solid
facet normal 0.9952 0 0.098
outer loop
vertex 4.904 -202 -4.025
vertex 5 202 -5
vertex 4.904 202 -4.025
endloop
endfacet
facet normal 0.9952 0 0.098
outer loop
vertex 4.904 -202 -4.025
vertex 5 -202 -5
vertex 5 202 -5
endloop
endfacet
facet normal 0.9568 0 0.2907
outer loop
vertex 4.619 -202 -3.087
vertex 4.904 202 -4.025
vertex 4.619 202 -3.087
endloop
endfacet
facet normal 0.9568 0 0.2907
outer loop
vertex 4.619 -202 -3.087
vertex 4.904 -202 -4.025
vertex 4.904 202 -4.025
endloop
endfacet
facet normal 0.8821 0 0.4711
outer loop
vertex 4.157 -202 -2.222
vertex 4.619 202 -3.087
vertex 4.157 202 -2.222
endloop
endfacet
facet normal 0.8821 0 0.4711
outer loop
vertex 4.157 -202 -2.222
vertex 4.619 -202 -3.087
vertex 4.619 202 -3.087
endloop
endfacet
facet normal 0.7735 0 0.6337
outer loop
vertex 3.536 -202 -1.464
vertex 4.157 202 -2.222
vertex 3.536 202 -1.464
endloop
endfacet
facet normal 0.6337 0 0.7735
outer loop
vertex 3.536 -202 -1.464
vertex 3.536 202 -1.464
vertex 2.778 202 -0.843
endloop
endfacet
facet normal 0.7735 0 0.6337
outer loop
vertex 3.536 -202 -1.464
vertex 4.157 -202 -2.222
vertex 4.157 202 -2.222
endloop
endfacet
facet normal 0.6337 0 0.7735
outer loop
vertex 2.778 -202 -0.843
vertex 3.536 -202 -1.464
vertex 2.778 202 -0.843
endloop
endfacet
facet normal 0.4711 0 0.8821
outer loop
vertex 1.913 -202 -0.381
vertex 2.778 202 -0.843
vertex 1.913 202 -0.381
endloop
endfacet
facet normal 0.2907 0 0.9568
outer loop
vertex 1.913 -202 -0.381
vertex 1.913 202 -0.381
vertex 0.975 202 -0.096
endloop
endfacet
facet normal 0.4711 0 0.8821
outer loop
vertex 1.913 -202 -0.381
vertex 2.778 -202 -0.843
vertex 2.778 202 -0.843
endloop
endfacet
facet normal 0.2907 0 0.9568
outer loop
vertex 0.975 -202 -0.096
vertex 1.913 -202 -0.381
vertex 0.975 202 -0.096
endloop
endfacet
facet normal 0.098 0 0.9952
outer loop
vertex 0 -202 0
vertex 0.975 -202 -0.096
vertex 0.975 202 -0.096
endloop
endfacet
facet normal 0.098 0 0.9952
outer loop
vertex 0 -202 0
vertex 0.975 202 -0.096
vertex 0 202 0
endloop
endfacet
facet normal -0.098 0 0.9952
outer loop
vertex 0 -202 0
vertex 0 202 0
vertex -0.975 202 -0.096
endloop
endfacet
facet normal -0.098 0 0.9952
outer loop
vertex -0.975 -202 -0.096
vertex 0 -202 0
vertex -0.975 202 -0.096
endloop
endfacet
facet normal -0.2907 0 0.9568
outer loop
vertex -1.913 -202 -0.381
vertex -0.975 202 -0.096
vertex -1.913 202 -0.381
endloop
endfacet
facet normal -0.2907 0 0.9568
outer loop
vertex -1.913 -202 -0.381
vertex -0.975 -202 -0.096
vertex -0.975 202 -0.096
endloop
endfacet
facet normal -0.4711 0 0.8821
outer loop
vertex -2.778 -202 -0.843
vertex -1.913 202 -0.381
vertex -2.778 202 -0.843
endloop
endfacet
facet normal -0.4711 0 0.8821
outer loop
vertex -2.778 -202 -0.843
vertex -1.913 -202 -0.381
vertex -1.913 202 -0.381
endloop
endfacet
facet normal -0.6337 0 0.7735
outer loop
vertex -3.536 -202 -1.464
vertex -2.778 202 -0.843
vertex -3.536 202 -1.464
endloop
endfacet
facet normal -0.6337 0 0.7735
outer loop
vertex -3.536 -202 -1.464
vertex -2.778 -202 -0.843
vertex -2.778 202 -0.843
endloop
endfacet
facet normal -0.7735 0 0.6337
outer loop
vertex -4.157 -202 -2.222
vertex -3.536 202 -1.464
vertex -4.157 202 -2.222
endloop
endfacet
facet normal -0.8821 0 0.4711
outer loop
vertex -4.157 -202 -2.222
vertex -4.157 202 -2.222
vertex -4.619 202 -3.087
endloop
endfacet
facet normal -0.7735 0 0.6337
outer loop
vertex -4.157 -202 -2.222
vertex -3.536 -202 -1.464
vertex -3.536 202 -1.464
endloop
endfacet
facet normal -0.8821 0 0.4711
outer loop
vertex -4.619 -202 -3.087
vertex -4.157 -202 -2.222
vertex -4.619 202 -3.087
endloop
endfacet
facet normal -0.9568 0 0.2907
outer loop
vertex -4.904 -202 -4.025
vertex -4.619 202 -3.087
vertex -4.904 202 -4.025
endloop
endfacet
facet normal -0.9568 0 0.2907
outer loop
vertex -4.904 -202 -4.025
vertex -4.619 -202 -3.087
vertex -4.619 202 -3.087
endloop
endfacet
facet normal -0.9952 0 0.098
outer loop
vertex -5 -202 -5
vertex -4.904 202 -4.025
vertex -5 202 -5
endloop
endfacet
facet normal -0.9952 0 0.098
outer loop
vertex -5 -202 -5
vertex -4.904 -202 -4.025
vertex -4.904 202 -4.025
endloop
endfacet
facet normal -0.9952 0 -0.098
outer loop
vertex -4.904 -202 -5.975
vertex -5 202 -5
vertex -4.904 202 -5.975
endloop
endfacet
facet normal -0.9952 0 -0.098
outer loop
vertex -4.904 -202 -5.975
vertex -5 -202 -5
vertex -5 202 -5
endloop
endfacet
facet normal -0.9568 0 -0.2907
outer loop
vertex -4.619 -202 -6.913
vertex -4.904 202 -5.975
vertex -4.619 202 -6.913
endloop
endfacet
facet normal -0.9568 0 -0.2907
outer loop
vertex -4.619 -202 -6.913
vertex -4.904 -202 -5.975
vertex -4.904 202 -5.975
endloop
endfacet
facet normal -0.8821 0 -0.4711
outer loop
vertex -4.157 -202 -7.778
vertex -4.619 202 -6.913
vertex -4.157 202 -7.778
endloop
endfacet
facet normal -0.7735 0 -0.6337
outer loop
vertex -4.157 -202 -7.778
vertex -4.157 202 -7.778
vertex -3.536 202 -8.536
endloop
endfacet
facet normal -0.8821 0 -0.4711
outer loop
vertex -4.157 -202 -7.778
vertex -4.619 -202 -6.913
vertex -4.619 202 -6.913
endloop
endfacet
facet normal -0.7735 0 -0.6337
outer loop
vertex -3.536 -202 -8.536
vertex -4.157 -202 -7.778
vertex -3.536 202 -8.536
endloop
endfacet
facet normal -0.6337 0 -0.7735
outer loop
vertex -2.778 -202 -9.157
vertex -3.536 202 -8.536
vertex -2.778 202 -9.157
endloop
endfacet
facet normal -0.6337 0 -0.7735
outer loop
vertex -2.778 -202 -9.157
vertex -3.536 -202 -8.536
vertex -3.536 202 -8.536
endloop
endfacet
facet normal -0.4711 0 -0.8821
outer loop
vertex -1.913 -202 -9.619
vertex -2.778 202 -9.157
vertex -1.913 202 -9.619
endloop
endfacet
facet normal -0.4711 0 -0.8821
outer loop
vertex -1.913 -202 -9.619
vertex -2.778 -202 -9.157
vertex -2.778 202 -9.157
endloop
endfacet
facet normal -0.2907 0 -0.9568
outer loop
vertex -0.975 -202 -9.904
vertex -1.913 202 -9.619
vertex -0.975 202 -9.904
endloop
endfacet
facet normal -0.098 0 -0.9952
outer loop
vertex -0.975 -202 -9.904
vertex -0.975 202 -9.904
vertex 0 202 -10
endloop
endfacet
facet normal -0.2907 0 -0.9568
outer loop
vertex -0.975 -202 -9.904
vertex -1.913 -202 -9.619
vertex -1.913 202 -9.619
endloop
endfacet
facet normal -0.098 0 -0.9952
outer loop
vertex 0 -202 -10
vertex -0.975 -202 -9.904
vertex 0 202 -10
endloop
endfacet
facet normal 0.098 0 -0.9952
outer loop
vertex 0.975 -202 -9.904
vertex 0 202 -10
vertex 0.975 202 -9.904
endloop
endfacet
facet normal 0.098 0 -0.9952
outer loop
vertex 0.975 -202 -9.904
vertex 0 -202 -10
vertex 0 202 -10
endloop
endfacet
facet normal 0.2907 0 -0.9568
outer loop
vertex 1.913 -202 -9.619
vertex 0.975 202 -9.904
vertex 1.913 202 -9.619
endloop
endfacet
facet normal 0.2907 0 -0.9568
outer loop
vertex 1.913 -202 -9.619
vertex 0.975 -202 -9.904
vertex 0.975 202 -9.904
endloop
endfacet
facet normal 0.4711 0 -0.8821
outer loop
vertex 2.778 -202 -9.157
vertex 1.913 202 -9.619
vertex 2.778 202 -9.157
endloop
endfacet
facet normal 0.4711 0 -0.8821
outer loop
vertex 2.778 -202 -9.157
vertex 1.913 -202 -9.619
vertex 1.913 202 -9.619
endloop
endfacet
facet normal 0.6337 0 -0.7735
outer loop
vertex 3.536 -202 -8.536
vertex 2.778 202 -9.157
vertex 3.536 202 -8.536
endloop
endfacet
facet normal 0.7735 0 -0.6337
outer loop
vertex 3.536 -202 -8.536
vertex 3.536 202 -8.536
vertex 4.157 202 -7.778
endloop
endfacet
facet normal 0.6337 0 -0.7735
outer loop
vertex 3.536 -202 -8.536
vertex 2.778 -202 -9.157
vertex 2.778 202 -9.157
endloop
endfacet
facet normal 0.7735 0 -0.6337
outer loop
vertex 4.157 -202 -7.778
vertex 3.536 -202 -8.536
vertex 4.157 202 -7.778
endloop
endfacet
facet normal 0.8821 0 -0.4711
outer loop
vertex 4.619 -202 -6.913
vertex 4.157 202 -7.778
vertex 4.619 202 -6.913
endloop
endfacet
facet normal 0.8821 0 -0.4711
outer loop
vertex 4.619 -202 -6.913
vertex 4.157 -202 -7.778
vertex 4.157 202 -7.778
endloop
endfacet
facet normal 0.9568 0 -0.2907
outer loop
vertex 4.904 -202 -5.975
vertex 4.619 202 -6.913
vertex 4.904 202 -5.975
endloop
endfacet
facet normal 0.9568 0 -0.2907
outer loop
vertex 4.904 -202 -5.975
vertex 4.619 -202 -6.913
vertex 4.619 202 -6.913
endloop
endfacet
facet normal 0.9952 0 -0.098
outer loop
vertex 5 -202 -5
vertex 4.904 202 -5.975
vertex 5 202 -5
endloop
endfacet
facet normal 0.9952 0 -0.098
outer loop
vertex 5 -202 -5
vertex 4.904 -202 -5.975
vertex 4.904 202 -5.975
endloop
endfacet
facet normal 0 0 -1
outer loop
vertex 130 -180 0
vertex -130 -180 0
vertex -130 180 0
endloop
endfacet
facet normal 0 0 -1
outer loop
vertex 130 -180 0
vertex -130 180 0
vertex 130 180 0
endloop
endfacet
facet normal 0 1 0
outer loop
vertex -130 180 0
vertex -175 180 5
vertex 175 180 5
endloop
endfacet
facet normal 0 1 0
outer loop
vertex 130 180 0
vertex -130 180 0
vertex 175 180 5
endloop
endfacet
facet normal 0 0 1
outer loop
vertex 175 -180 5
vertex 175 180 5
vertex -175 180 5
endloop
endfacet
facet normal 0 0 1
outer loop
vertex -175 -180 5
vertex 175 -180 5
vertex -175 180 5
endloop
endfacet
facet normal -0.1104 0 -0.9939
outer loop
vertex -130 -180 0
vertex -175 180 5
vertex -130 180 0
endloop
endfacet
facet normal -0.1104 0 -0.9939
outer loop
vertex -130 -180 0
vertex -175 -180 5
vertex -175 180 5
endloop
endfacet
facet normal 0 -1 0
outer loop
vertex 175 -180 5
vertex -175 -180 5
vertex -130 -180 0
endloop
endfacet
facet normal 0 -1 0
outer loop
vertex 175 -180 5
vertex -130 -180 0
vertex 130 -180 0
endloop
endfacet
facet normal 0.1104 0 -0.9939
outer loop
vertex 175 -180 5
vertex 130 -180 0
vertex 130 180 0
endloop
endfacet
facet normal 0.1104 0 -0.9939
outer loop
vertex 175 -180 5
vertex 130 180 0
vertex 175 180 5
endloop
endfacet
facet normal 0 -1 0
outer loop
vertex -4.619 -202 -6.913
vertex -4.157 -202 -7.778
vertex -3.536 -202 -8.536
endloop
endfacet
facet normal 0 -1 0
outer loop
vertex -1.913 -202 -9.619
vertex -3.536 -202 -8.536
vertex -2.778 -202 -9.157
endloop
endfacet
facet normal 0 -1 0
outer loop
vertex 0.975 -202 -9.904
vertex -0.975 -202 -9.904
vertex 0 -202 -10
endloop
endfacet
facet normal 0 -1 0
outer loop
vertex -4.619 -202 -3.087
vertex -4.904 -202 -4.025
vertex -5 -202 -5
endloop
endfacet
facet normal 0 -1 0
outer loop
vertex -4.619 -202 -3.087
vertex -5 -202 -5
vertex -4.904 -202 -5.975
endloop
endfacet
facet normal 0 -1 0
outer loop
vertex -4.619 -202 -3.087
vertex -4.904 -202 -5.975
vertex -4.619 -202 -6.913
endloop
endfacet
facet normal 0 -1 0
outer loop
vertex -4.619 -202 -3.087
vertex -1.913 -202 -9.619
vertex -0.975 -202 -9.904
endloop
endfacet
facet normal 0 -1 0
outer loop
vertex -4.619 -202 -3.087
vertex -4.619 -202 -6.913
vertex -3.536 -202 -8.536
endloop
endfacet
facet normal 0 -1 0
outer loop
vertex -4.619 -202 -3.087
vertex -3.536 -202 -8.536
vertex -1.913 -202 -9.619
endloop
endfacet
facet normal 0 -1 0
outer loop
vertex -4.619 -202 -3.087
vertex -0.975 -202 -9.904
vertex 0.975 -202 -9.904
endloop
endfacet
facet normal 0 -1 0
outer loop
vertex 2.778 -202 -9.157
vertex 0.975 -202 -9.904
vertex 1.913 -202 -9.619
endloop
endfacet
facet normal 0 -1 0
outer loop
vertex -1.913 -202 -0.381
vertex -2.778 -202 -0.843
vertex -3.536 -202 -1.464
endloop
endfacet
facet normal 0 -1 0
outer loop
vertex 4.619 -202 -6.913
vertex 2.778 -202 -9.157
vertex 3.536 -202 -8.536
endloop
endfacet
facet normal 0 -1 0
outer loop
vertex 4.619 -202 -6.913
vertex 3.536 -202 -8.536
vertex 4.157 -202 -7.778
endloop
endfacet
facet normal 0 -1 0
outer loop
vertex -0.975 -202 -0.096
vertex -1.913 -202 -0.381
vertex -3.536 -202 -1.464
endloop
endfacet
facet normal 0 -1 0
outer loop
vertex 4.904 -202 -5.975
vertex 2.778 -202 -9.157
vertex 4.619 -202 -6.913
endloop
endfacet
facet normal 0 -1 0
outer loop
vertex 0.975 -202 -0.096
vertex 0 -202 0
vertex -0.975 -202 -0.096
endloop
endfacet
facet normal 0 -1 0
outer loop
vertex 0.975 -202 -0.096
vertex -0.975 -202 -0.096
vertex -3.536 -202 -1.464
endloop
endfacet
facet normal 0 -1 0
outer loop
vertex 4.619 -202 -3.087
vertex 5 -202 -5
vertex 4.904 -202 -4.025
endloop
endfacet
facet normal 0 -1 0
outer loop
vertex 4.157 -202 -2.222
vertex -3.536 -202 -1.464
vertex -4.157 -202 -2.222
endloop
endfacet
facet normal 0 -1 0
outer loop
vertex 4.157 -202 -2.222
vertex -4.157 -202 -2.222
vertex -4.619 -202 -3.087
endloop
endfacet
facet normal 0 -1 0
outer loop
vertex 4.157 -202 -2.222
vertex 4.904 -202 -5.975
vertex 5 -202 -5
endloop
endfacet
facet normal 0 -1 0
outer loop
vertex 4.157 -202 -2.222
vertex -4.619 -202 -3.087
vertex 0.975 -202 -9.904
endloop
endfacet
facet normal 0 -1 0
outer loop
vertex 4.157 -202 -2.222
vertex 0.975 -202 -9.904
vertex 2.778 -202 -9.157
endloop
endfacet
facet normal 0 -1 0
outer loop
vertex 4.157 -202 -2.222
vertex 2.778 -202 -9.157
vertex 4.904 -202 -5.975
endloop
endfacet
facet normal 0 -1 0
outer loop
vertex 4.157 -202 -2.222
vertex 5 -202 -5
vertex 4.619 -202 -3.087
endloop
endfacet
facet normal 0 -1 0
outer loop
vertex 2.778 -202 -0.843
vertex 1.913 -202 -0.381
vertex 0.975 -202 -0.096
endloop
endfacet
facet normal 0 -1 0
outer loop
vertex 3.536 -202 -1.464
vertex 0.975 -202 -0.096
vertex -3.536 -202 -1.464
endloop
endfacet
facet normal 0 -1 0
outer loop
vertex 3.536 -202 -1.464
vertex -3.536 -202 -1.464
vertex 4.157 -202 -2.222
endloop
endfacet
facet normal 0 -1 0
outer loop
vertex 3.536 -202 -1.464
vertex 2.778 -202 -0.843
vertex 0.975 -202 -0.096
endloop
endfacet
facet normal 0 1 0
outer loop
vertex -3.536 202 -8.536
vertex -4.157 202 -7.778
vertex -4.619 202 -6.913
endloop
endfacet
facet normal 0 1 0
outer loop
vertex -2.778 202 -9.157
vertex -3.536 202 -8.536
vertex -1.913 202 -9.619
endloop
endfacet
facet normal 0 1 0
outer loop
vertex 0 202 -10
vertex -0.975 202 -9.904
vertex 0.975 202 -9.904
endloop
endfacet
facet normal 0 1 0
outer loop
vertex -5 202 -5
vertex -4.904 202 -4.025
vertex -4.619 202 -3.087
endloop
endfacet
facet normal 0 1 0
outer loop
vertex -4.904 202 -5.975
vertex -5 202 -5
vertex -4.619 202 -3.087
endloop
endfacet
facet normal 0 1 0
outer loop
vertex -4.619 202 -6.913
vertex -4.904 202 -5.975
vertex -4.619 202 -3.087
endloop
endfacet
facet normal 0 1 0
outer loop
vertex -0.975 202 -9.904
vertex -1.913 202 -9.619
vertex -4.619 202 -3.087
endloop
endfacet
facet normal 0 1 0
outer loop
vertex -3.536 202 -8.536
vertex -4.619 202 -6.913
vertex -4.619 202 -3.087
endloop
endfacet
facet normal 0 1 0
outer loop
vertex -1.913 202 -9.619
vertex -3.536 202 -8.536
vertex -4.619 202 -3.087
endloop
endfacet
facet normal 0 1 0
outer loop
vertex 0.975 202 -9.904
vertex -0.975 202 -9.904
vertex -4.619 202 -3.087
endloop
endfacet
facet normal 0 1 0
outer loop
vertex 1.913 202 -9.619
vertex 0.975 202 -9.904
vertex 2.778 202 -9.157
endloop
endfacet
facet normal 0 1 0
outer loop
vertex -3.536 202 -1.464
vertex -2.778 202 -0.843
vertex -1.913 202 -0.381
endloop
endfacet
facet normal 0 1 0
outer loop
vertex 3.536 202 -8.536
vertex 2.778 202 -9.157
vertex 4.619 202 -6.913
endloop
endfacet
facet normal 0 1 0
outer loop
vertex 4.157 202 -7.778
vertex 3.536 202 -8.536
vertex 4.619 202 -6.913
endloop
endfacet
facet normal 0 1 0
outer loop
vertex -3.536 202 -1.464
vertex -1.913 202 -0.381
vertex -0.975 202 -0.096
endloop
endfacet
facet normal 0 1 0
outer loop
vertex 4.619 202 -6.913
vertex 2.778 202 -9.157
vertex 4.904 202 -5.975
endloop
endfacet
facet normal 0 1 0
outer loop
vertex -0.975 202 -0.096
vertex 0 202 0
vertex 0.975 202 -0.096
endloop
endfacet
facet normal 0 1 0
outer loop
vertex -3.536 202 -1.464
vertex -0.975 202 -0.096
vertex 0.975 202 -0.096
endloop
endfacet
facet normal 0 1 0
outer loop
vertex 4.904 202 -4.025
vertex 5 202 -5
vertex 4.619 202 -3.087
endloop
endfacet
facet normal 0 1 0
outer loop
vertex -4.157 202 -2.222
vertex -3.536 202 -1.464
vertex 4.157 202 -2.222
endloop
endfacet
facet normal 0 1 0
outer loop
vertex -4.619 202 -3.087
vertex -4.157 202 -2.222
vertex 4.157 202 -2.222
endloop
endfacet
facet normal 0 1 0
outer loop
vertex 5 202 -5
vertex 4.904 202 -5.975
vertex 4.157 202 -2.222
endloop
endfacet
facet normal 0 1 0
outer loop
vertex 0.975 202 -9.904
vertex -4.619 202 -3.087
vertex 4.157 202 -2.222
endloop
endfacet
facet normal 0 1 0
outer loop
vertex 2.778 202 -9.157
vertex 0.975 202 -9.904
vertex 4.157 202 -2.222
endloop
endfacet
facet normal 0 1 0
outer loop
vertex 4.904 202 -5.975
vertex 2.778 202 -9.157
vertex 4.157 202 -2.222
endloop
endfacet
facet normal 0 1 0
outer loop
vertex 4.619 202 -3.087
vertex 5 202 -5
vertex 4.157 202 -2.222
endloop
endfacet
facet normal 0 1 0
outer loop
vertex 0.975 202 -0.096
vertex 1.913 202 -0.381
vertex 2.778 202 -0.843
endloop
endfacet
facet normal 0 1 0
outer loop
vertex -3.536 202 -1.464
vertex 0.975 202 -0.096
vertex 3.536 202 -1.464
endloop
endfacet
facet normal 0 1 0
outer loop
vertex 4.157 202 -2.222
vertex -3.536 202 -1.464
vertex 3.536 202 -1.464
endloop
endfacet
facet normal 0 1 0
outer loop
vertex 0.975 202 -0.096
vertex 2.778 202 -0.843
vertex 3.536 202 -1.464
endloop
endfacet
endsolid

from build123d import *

# Parameters (mm, degrees)
F1_DEPTH = 180
F2_R     = 5
F3_DEPTH = 202


with BuildPart() as f1:
    # F0 (on Front) → F1 (new body, symmetric)
    with BuildSketch(Plane.XZ):
        Polygon((-175, 5), (-130, 0), (130, 0), (175, 5), align=None)
    extrude(amount=F1_DEPTH, both=True)


with BuildPart() as f3:
    # F2 (on Front) → F3 (new body, symmetric)
    with BuildSketch(Plane.XZ):
        with Locations((0, -5)):
            Circle(F2_R)
    extrude(amount=F3_DEPTH, both=True)


solid = Compound([f1.part, f3.part])
